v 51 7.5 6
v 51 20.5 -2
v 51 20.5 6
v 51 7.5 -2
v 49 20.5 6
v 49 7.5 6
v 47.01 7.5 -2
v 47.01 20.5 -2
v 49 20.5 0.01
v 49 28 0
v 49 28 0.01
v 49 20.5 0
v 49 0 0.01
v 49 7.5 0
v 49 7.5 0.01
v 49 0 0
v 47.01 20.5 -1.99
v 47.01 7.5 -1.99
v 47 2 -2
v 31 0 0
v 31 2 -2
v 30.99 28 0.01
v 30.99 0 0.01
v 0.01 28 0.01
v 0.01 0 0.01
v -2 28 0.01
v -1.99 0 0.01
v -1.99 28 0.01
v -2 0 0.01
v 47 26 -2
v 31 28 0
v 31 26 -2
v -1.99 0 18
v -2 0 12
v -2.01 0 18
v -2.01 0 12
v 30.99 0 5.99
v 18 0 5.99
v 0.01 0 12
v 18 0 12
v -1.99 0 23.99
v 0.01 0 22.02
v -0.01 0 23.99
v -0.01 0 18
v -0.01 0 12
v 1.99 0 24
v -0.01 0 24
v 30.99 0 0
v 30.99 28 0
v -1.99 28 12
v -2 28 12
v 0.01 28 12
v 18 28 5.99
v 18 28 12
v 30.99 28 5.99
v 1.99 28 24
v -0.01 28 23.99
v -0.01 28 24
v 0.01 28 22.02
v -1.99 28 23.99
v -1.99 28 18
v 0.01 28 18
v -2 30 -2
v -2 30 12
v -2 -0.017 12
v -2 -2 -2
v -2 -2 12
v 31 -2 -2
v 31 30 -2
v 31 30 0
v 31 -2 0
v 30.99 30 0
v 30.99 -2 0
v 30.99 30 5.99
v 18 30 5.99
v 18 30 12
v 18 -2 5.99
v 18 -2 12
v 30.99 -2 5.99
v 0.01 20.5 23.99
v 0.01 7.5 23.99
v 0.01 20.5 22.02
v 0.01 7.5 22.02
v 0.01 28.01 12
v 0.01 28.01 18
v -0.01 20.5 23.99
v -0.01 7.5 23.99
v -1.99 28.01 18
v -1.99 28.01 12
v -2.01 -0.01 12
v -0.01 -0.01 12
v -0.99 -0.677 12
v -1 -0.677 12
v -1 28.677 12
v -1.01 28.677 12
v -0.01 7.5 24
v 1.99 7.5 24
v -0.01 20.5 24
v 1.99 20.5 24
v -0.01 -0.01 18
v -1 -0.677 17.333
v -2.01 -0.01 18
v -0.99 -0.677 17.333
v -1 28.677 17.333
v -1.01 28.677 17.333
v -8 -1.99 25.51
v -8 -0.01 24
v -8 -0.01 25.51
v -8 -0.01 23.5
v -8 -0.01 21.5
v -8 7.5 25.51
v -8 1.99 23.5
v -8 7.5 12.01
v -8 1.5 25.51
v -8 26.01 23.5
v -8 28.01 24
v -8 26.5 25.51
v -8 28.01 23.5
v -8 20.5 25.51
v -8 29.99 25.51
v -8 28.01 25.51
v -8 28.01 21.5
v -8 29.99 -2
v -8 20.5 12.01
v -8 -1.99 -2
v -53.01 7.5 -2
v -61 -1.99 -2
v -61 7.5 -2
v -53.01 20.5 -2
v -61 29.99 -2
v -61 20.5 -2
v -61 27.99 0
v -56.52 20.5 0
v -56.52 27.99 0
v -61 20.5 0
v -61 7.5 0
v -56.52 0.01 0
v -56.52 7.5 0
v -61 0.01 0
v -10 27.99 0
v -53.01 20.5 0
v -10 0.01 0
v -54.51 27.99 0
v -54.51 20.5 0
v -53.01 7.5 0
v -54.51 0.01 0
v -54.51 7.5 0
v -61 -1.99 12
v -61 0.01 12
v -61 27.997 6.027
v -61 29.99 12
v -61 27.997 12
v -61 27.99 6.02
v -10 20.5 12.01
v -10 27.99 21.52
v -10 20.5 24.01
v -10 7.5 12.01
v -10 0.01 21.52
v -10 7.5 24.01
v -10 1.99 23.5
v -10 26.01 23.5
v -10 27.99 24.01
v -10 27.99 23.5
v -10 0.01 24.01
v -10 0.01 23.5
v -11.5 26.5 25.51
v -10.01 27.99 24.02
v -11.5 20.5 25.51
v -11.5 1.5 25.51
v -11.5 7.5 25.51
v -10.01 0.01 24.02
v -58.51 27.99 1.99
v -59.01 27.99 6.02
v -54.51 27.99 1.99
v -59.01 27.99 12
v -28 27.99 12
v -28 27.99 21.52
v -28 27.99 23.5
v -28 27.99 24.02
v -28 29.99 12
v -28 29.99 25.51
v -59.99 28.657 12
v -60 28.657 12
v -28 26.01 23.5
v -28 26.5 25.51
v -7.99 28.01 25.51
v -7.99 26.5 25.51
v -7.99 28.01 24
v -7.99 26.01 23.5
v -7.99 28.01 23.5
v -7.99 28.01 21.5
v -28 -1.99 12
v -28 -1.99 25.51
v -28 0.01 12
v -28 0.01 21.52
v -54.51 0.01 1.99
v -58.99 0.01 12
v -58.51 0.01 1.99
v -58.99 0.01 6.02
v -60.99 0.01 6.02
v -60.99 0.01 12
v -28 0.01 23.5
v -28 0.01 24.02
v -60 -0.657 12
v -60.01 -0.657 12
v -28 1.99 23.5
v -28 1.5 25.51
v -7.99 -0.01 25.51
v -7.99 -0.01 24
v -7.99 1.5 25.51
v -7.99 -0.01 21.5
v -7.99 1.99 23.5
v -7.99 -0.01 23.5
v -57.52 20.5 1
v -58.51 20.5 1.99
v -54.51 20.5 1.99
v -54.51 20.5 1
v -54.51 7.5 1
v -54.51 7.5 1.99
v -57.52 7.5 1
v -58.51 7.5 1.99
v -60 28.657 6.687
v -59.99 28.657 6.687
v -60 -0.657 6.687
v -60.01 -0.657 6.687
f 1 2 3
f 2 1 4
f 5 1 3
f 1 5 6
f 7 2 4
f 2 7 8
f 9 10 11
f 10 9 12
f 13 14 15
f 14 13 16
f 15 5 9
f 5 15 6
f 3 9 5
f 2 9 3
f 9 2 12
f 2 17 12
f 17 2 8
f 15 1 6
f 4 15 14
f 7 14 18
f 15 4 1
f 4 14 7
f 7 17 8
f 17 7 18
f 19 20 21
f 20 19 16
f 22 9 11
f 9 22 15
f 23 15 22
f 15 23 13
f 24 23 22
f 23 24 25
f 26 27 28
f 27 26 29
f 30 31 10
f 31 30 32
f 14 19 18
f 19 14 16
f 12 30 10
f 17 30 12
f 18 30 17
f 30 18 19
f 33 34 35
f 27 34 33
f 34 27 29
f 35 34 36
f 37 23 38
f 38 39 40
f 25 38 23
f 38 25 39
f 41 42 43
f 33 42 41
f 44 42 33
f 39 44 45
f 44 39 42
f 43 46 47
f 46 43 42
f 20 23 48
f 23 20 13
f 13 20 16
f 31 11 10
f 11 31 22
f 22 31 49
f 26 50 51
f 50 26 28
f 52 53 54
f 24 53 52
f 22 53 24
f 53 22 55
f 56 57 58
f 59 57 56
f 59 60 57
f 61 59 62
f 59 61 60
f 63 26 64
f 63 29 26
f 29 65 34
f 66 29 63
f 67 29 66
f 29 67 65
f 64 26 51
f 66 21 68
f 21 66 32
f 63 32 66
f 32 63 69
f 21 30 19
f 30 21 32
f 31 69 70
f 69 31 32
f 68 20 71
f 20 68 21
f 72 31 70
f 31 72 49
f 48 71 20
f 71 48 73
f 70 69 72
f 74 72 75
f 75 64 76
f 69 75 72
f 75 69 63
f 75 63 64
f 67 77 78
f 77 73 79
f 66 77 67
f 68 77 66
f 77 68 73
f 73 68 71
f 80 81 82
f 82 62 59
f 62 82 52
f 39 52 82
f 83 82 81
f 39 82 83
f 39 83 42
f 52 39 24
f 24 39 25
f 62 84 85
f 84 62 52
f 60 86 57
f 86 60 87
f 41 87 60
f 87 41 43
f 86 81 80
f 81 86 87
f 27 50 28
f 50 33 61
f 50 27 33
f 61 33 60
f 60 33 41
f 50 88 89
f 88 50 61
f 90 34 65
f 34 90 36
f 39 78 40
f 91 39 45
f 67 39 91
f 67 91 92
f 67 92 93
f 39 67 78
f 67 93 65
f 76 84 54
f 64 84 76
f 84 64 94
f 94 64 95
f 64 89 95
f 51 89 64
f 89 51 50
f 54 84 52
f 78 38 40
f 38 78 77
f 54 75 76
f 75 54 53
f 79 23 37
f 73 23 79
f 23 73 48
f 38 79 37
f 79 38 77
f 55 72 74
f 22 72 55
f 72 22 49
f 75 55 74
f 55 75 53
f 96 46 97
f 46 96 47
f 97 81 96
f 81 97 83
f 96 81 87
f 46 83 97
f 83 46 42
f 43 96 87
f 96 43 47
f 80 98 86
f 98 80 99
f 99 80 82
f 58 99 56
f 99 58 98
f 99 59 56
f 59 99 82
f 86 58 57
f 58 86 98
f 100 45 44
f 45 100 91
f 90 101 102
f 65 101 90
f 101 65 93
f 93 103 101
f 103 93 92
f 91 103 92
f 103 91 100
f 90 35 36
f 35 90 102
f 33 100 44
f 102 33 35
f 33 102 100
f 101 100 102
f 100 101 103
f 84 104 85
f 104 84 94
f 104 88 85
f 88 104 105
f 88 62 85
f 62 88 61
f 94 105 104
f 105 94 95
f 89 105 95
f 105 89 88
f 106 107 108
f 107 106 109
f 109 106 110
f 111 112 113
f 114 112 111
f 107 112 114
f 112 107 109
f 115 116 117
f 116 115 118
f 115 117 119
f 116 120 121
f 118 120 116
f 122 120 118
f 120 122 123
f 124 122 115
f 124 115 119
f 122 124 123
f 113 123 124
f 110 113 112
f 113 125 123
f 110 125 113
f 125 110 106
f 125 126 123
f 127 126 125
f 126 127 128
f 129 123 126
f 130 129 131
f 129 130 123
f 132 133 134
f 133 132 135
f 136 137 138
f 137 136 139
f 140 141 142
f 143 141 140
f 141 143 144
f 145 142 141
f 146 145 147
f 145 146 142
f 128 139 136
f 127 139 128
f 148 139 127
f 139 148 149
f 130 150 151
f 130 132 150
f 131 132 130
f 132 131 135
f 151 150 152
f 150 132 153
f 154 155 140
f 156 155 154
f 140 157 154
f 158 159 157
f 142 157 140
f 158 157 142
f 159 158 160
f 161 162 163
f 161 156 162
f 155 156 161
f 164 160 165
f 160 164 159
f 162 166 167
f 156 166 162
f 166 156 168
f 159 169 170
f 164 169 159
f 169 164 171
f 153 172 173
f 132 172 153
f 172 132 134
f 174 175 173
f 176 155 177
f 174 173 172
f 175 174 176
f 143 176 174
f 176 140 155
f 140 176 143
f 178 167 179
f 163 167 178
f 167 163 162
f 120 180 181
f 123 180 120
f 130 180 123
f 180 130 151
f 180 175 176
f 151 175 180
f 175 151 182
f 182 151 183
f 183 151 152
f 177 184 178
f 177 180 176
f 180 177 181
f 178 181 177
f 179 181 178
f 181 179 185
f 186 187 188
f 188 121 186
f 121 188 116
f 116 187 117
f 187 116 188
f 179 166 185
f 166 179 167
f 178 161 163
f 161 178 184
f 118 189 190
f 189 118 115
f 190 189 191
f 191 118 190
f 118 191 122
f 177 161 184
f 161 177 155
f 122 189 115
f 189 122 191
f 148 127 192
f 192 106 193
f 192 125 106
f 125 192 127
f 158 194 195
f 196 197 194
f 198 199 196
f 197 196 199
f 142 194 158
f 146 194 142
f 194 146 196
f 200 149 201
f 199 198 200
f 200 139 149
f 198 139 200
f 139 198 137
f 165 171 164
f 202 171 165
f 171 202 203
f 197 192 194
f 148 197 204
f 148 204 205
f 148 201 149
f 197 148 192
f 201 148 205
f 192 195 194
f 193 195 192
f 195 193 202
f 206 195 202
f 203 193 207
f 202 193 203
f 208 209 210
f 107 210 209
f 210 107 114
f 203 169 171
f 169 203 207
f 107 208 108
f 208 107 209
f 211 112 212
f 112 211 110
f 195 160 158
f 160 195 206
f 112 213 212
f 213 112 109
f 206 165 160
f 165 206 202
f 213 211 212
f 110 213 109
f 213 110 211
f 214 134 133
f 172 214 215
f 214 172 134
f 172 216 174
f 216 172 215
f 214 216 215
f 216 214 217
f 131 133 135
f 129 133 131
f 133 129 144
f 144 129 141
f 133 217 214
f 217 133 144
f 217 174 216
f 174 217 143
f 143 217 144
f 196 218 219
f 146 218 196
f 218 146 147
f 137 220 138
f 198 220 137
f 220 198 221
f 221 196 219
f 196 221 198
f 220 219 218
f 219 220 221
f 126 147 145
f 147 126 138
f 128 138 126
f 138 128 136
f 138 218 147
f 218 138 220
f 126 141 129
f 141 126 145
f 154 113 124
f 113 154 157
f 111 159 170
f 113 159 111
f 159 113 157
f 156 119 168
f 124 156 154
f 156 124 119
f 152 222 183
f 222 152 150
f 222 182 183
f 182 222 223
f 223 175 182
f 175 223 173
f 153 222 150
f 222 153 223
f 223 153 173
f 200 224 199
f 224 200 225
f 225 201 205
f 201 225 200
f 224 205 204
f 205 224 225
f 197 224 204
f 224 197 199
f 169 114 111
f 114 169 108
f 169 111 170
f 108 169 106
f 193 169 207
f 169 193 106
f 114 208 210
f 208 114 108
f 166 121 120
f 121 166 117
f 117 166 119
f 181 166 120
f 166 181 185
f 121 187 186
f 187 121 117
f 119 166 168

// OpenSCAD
/* [Sizes] */
// size X
x=49;
// size Y
y=28;
// size Z
z=24;
// plus wall
w=2.0;//[1:0.2:5]

/* [Holes] */
// left
h1=true;
// right
h2=true;
// front
h3=true;
// top
h4=true;

// hole width
cw=13;
// top hole width
ch=6;
// upper edge
chh=12;
// lower edge
chl=6;
// side offset
cso=0;

/* [Hidden] */
_d1=0.01;
_d2=0.02;
_d3=0.03;

module indent(c) {
    hull() {
        translate([w/2,0,w/3]) cube([_d1,c-w/3,_d1]);
        translate([-_d1,0,0]) cube([w,c,_d1]);
    }
}

module bottom() {
    hull() { 
        translate([-w,0,0]) cube([x+w,y,_d1]);
        translate([-w,w,-w]) cube([x,y-2*w,_d1]);
    }
    translate([-w,-w,-w]) cube([x/2+cw/2+w+cso,y+2*w,w]);
    translate([_d1-w,0,-_d1]) cube([w,y,z]);
    translate([_d1-w,-w,-w]) cube([w,y+2*w,w+chh]);
    translate([-w,-w,-w]) cube([x/2-cw/2+w+cso,w,w+chh]);
    translate([-w,y,-w]) cube([x/2-cw/2+w+cso,w,w+chh]);
    // lowers
    if(h3) {
        translate([x,y/2-cw/2,-w]) cube([w,cw,chl+w]);
        translate([x-w+_d1,y/2-cw/2,-w]) cube([w+_d2,cw,w]);
    }
    translate([x/2-cw/2-_d1+cso,-w,-_d1]) cube([cw,w,h2?chl:chh]);
    translate([x/2-cw/2-_d1+cso,y,-_d1]) cube([cw,w,h1?chl:chh]);
    // align sliders on top
    translate([-_d1,0,z]) rotate([-90,0,0]) linear_extrude(y/2-cw/2) polygon([[0,0],[0,w],[w,0]]);
    translate([-_d1,y/2+cw/2,z]) rotate([-90,0,0]) linear_extrude(y/2-cw/2) polygon([[0,0],[0,w],[w,0]]);
    // indents on side
    translate([-w,0,chh]) rotate([90,0,0]) indent((z-chh)/2);
    translate([0,y,chh]) rotate([90,0,180]) indent((z-chh)/2);
    
}
module side_top() { 
    rotate([90,0,0]) linear_extrude(w) polygon([
        // top and right sides
        [-w,z+w], [x+w,z+w], [x+w,-w],
        // hole
        [x/2+cw/2+cso,-w], [x/2+cw/2+cso,chh], [-w,chh], 
    ]);
}
module _top() {
    // top
    translate([-w,0,z]) cube([x+2*w,y,w]);
    // front
    translate([x,0,-w]) cube([w,y,z+2*w]);
    translate([x-w+_d1,0,0]) rotate([-90,0,0]) linear_extrude(y) polygon([[w,w],[0,w],[w,0]]);
    // left
    //translate([-w,_d1-w,-w]) cube([x+2*w,w,z+2*w]);
    translate([0,_d1,0]) side_top();
    translate([x/2+cw/2+cso,-_d1,-w]) rotate([0,90,0]) linear_extrude(x/2-cw/2-cso+w+_d1) polygon([[0,0],[0,w],[-w,0]]);
    translate([x/2+cw/2+cso,-_d1,w/4]) rotate([0,90,0]) linear_extrude(x/2-cw/2+w-cso+_d1) polygon([[0,0],[0,w],[-w,0]]);
    // right
    translate([0,y+w-_d1,0]) side_top();
    translate([x/2+cw/2+cso,y+_d1,-w]) rotate([0,90,0]) linear_extrude(x/2-cw/2-cso+w+_d1) polygon([[0,0],[0,-w],[-w,0]]);
    translate([x/2+cw/2+cso,y+_d1,w/4]) rotate([0,90,0]) linear_extrude(x/2-cw/2-cso+w+_d1) polygon([[0,0],[0,-w],[-w,0]]);
    // guides at top
    translate([-_d1+w/4,0,z+_d1]) rotate([-90,0,0]) linear_extrude(y/2-cw/2) polygon([[2*w,0],[2*w,w],[0,w],[w,0]]);
    translate([-_d1+w/4,y/2+cw/2,z+_d1]) rotate([-90,0,0]) linear_extrude(y/2-cw/2) polygon([[2*w,0],[2*w,w],[0,w],[w,0]]);
}
module top() {
    difference() {
        _top();
        // cable on top
        if(h4) translate([-w-_d1,y/2-cw/2,z-w/2]) cube([ch+w,cw,2*w]);
        // cable on front
        if(h3) translate([x-1.5*w,y/2-cw/2,-w-_d1]) cube([3*w,cw,chh+w]);
        // indents on side
        translate([-w,_d2,chh-_d2]) rotate([90,0,0]) indent((z-chh)/2);
        translate([0,y-_d2,chh-_d2]) rotate([90,0,180]) indent((z-chh)/2);
        // cut odd top and bottom a bit
        translate([-w-_d1,-w-_d1,-w-_d1]) cube([x+2*w+_d3,y+2*w+_d3,w/4]);       
    }
}

//difference() { union() {
bottom();
if($preview) color([0,1,0,.3]) top();
translate([-x-5*w,y,z]) rotate([180,0,0]) top();
//}translate([-8*w-x,-2*w,-2*w]) cube([2*x+10*w,y/2+2*w,z+4*w]);}
